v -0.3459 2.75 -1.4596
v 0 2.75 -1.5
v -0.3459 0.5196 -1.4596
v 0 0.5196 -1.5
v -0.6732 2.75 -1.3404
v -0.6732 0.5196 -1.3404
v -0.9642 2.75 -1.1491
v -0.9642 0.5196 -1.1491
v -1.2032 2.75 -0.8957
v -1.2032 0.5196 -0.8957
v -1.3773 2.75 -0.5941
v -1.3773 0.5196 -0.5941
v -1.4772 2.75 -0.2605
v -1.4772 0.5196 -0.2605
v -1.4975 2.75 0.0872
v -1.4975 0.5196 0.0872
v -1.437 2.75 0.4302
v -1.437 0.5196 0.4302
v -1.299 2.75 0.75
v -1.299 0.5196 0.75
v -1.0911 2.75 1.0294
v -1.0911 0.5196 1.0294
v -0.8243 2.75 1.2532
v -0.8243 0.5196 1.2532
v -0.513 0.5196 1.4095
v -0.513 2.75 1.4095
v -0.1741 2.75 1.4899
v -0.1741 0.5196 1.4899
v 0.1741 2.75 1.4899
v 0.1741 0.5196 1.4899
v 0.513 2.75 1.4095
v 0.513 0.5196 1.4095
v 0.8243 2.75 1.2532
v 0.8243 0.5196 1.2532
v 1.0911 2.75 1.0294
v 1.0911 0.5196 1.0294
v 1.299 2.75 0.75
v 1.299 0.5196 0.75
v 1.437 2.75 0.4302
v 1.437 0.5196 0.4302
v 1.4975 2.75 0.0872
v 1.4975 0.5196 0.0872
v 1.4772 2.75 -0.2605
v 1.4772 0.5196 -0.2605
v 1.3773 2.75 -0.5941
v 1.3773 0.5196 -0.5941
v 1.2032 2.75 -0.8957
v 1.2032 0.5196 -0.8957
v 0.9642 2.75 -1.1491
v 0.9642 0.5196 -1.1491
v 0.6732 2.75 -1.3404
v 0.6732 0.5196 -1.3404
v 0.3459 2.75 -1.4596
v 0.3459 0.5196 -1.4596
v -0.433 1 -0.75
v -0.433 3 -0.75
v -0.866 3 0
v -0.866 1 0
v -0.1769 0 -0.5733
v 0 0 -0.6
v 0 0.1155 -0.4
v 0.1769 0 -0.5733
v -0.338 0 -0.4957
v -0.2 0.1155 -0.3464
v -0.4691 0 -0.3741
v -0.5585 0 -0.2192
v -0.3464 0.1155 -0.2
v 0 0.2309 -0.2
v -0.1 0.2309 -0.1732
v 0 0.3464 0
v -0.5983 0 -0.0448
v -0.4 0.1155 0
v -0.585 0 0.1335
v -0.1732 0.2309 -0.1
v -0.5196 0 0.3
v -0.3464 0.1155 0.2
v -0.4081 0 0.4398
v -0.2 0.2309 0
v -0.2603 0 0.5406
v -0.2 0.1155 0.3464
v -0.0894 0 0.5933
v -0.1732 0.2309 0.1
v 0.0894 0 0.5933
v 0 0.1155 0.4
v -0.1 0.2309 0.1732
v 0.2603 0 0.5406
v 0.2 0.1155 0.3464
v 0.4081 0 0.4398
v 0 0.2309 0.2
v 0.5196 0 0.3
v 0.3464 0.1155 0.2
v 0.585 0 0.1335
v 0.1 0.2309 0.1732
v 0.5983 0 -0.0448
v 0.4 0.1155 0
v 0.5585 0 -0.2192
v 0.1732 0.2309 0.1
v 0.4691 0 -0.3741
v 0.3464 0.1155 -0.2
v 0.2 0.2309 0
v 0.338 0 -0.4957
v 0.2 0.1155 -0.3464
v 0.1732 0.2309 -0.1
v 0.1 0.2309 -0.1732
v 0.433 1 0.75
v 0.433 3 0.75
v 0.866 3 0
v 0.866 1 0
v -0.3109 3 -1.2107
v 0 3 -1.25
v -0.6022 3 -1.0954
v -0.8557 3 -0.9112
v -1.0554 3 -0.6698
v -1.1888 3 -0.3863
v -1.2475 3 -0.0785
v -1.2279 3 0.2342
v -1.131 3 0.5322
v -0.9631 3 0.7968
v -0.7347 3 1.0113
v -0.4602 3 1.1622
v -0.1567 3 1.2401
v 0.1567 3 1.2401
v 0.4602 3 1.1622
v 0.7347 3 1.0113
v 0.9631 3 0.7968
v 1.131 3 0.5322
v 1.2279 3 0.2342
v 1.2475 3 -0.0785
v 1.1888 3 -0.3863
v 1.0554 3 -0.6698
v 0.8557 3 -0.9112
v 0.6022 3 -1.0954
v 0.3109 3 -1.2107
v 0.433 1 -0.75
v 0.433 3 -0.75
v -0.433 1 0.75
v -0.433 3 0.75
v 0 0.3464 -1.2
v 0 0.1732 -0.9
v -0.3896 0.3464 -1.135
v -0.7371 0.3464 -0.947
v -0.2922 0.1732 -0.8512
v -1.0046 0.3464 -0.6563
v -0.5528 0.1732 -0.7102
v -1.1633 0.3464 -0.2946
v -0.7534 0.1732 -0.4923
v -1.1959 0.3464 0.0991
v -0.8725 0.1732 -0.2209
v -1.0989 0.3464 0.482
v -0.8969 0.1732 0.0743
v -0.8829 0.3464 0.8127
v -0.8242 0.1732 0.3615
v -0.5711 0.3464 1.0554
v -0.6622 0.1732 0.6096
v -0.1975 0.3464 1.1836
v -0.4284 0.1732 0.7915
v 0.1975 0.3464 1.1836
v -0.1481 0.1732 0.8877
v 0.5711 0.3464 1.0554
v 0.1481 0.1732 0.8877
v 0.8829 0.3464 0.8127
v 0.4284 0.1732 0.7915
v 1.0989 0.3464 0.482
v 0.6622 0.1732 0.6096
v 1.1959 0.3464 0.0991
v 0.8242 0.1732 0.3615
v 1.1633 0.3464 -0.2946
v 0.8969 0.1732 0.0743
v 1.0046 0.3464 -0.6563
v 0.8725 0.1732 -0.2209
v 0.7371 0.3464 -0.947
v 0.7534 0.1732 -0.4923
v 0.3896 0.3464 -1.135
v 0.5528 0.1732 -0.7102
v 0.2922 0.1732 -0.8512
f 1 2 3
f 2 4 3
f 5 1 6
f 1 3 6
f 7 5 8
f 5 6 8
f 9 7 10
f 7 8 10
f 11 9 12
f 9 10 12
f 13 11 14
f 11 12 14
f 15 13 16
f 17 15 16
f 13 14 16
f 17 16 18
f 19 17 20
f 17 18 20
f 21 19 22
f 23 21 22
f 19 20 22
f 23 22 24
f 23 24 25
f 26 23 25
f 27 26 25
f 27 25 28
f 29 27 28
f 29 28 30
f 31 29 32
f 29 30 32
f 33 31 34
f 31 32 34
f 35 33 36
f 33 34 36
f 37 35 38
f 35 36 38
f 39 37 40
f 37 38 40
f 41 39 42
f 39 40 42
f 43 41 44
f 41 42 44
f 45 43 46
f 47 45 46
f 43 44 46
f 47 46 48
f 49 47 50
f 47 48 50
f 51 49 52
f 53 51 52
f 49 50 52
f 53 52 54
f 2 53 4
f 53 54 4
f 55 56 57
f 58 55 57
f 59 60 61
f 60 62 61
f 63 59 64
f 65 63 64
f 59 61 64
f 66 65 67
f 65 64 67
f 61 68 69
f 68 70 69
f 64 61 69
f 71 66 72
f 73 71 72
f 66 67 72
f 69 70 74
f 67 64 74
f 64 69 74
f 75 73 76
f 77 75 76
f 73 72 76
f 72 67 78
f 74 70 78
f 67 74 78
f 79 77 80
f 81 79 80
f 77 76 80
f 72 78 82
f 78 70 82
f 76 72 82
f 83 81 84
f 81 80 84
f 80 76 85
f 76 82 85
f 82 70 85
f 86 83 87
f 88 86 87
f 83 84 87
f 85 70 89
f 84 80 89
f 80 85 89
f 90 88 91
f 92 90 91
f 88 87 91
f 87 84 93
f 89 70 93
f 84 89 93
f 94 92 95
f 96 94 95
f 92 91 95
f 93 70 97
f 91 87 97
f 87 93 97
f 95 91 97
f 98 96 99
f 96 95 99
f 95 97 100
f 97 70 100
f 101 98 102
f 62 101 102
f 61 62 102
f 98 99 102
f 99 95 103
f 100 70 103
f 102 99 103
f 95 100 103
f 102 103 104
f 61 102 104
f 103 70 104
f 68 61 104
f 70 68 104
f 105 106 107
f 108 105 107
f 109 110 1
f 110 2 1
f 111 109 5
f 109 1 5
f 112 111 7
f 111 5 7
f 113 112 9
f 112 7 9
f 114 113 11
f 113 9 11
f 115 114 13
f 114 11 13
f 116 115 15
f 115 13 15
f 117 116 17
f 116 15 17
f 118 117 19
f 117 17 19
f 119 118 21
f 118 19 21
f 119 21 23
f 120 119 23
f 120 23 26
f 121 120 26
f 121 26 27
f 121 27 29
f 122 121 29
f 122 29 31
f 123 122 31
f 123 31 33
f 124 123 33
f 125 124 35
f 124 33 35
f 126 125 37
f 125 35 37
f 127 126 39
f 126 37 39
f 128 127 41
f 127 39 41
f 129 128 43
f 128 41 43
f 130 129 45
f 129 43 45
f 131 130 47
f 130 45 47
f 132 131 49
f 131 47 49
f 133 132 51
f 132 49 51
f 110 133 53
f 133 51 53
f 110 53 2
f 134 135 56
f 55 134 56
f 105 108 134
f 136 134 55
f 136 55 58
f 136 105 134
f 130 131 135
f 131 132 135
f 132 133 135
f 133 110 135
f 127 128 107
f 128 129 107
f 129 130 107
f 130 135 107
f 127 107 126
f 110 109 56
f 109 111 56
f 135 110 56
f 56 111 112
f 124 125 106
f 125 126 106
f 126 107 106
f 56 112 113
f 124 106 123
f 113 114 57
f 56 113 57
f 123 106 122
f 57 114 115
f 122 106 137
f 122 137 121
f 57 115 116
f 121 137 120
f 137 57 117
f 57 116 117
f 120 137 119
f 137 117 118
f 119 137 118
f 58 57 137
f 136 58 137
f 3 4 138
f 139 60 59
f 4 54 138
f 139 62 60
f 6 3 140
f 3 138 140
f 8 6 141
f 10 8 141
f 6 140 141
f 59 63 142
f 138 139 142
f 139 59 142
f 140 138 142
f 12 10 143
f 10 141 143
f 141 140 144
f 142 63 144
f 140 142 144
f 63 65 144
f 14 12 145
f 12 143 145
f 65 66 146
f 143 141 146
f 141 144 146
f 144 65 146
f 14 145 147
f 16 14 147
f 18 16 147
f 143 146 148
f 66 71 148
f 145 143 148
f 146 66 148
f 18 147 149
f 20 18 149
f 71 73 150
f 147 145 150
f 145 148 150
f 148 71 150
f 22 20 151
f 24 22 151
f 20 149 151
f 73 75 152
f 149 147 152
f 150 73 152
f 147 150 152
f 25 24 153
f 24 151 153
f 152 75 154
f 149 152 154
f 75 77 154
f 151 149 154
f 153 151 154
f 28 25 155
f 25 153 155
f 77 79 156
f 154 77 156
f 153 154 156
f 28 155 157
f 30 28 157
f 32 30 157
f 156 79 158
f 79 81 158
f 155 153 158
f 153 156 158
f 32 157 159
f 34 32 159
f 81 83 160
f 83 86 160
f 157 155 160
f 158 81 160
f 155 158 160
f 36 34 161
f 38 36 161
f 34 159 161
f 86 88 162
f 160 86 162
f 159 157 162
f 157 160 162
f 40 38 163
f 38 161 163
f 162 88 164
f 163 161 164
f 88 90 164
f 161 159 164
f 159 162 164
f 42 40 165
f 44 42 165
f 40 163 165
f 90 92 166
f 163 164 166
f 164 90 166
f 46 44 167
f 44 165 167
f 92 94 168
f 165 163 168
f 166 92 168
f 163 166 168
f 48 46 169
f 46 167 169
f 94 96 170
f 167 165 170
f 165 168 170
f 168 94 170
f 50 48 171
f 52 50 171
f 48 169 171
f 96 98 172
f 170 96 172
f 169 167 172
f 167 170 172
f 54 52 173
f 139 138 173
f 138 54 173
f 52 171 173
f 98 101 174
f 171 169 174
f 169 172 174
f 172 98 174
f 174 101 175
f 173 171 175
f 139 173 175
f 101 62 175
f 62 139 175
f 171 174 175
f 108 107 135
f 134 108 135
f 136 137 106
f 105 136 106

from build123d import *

# Parameters (mm, degrees)
CUT_EXTRUDE1_DEPTH = 2


with BuildPart() as part:
    # Sketch1 → Base-Revolve (revolve)
    with BuildSketch(Plane.XY, mode=Mode.PRIVATE) as base_revolve_sk:
        Polygon((0, 0.346410162), (0, 3), (1.25, 3), (1.5, 2.75), (1.5, 0.519615242), (0.6, 0), align=None)
    revolve(base_revolve_sk.sketch.rotate(Axis((0, 3, 0), (0, 1, 0)), 90), axis=Axis((0, 3, 0), (0, 1, 0)))  # turned: the seam where the file's is

    # Sketch2 → Cut-Extrude1 (cut)
    with BuildSketch(Plane(origin=(0, 3, 0), x_dir=(-1, 0, 0), z_dir=(0, 1, 0))):
        Polygon((-0.433012702, 0.75), (-0.866025404, 0), (-0.433012702, -0.75), (0.433012702, -0.75), (0.866025404, 0), (0.433012702, 0.75), align=None)
    extrude(amount=-CUT_EXTRUDE1_DEPTH, mode=Mode.SUBTRACT)


solid = part.part
